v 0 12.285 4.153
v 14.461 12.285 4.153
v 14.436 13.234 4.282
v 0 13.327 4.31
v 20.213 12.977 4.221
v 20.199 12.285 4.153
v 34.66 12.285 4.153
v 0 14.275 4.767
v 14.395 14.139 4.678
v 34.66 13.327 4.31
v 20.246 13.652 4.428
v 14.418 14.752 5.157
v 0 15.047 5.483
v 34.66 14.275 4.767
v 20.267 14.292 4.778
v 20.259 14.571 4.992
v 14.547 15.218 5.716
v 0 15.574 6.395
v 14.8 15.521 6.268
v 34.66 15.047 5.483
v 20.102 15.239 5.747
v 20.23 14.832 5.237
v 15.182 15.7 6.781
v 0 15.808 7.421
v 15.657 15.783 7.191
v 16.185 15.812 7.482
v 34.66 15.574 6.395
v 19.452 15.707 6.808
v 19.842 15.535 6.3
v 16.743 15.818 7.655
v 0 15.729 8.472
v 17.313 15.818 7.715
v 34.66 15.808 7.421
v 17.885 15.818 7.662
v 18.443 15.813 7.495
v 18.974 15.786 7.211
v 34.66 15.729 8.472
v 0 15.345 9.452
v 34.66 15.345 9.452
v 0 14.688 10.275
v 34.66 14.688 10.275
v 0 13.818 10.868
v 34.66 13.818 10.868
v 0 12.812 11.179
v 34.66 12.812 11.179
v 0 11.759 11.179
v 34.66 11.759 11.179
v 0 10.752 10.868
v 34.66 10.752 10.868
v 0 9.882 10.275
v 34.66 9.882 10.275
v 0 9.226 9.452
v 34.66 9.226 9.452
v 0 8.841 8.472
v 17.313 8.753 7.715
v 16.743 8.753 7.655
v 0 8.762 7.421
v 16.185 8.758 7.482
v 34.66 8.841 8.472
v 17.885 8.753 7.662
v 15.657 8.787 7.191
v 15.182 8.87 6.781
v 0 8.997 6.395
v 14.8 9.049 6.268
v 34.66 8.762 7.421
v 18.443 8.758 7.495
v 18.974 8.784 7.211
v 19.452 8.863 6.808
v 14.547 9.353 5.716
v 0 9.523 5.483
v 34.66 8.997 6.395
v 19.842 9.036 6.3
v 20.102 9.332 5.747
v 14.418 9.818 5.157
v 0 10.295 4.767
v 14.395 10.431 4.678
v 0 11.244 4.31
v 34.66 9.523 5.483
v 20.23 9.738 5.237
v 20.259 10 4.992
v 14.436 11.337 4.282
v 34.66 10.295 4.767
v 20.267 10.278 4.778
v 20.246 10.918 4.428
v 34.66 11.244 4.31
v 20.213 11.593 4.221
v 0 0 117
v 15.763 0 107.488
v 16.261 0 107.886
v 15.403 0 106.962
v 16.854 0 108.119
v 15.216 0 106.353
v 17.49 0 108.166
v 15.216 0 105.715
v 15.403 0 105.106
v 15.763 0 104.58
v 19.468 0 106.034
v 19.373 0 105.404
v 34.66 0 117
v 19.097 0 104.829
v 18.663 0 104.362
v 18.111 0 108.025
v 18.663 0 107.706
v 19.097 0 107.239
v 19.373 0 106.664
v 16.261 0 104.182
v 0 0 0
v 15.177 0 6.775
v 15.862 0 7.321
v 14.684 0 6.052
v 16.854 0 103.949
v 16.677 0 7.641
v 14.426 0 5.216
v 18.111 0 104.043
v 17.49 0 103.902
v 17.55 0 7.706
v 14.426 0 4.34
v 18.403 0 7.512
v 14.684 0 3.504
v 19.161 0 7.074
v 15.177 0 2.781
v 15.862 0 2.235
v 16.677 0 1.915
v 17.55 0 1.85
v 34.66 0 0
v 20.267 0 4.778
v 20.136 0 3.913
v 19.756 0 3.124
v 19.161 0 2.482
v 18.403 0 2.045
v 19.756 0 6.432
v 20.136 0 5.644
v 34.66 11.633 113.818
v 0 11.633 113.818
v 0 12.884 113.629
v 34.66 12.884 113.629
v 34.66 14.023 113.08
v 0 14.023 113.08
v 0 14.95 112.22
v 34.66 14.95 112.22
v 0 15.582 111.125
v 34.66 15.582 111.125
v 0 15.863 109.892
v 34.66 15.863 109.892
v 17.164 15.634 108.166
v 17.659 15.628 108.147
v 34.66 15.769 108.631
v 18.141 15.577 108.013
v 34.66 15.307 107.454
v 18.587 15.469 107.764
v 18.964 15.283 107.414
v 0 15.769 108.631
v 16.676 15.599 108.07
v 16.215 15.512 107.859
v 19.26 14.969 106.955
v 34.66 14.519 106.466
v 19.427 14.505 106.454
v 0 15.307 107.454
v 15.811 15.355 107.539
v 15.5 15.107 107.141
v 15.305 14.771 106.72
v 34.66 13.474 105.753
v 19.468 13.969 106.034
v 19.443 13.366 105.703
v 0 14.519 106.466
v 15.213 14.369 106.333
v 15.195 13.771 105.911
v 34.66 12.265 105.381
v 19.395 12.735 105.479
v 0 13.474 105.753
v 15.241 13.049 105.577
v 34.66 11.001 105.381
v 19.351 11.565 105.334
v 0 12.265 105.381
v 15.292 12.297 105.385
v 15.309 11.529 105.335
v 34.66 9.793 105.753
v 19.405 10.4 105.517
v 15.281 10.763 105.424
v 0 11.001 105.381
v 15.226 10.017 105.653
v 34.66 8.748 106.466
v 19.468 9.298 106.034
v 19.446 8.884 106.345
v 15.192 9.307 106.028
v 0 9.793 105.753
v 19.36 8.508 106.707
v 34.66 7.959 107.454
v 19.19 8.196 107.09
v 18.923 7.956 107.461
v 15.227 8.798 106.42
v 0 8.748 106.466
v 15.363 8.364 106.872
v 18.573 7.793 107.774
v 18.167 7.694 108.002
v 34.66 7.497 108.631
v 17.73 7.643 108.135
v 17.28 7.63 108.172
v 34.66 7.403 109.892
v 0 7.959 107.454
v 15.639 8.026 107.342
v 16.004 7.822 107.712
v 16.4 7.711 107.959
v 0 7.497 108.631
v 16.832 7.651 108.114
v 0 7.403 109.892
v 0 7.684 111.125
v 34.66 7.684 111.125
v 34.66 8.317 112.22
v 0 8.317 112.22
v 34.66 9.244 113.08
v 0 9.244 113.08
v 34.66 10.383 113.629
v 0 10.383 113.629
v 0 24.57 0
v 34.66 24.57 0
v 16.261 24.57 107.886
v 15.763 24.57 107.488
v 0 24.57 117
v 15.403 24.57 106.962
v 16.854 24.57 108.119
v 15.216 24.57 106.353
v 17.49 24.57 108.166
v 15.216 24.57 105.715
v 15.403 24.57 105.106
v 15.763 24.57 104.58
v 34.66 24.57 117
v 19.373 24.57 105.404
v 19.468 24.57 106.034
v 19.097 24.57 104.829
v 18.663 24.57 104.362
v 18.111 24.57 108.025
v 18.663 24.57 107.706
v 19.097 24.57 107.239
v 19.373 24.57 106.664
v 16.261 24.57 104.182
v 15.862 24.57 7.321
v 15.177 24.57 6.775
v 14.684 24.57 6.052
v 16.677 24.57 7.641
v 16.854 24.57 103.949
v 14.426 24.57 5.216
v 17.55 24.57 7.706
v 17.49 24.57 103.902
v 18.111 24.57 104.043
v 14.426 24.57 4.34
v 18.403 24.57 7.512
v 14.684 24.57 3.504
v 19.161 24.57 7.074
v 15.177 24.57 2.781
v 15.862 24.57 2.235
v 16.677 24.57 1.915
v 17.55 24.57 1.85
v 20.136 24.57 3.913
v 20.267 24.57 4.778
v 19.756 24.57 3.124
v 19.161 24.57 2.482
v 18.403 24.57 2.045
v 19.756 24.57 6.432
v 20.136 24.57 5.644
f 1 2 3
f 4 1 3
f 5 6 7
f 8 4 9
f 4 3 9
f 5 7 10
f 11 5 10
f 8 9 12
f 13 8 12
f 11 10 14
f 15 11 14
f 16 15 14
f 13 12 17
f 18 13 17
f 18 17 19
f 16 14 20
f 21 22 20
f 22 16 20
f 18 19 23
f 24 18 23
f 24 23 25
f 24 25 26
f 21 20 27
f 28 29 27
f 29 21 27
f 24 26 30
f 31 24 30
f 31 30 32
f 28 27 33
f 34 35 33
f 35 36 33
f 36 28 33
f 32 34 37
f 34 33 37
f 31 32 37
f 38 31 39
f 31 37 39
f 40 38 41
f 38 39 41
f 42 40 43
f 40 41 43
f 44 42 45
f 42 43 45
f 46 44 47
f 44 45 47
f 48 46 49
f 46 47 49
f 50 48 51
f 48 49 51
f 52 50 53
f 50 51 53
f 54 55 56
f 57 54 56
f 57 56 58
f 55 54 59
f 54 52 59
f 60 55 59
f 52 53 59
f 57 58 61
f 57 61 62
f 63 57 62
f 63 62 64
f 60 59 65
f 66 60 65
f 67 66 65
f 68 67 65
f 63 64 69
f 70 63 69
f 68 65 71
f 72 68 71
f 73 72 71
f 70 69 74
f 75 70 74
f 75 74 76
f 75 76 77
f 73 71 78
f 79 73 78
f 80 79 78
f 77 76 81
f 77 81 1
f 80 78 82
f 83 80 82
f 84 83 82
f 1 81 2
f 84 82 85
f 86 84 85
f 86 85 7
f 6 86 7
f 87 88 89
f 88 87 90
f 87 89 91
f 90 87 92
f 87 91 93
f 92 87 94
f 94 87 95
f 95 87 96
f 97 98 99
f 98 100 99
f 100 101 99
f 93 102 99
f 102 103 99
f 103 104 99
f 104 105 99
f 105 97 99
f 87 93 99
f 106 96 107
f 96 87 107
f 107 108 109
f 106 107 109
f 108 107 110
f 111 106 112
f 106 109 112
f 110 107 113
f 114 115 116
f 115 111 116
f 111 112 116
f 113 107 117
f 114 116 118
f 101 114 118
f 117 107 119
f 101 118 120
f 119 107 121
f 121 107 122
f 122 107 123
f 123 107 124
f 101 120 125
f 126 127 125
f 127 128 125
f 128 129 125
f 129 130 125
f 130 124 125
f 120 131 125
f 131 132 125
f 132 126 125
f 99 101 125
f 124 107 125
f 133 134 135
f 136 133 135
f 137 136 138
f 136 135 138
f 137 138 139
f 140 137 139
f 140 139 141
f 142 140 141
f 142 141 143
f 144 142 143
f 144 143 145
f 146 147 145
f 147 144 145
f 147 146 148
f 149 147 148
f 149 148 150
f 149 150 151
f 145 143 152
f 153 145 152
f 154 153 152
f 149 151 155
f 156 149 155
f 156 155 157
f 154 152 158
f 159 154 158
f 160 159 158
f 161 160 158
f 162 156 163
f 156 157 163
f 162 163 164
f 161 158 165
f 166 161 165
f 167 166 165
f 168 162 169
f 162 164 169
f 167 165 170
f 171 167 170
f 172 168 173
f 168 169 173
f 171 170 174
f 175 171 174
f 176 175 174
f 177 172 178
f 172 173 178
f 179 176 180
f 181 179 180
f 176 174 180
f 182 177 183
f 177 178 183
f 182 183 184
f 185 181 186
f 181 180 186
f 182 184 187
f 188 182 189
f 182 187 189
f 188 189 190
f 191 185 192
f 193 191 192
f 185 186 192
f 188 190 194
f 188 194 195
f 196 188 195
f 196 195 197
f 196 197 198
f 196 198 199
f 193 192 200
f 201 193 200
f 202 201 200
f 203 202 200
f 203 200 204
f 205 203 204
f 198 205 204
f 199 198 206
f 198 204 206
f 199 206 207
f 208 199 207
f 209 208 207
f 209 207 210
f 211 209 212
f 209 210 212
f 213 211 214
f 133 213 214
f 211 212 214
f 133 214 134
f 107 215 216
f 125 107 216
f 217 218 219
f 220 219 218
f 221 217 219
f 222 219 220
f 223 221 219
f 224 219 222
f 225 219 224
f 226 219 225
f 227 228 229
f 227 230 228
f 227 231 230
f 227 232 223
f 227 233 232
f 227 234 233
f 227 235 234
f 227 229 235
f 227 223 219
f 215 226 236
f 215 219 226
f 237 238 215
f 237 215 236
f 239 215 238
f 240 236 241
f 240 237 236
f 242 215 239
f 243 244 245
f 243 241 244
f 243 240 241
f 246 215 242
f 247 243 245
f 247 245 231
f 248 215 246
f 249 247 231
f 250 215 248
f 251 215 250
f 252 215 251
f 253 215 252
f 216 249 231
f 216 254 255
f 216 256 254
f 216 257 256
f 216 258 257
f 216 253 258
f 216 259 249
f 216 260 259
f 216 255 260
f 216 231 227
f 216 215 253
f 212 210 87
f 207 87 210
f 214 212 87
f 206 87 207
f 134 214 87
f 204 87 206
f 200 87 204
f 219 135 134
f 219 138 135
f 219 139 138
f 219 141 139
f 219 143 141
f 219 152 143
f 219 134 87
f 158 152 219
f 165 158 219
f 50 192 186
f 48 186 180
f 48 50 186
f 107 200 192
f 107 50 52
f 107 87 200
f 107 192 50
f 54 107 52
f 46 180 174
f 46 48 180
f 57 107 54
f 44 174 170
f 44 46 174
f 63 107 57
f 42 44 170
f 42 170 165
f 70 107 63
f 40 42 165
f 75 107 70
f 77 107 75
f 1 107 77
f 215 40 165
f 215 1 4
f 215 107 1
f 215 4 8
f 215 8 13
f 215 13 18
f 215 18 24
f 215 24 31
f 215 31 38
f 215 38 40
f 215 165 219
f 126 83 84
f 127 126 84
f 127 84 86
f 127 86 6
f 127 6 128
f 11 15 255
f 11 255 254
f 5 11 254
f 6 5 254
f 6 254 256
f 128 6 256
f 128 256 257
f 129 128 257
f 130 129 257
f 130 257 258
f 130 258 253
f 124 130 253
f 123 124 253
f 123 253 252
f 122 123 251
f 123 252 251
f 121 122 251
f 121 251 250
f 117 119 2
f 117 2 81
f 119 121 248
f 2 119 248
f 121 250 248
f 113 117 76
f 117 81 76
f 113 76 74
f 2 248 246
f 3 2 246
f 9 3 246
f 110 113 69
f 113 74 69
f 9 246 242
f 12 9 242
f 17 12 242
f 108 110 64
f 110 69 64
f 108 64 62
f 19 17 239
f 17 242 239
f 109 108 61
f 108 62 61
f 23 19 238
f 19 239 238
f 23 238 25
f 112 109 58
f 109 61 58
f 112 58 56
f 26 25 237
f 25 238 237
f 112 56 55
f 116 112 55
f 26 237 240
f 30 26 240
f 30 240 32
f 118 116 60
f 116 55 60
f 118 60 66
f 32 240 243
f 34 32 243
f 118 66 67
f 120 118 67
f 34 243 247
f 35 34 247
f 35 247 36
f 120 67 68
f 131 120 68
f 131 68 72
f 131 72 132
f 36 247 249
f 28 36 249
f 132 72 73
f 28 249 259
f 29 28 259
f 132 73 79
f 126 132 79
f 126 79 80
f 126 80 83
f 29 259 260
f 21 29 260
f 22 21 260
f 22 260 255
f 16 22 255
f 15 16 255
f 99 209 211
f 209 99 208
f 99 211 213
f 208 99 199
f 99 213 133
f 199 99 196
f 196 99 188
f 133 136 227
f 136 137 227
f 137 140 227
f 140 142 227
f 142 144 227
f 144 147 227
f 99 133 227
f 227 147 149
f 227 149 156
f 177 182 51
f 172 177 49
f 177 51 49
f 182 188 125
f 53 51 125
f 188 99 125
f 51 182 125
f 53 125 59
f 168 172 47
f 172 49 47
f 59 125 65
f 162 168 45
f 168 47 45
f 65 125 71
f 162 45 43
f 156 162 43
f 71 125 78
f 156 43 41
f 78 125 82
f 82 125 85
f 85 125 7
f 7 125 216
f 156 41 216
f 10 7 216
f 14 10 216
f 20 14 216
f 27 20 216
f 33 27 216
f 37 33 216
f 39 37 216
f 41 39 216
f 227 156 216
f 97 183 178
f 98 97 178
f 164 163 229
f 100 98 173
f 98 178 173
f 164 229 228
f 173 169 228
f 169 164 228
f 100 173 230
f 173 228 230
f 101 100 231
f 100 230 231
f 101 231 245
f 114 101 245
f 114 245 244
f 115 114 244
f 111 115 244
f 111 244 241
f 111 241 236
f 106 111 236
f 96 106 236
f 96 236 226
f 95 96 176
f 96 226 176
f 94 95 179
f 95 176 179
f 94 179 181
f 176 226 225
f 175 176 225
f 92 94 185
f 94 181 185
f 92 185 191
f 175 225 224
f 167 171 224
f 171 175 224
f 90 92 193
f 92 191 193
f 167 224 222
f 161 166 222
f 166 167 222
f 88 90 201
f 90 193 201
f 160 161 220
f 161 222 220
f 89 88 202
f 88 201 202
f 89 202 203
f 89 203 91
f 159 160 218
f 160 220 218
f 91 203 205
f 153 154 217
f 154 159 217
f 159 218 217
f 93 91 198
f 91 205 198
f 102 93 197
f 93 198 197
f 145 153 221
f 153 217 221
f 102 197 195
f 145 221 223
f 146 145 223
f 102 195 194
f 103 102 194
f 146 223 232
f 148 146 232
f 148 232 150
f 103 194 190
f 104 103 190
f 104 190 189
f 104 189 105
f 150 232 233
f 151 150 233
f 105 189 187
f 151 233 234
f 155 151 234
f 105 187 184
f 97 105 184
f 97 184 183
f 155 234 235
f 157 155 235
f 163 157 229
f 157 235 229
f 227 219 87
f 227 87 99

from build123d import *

# Parameters (mm, degrees)
SKETCH_1_W          = 34.660183122
SKETCH_1_H          = 24.57042631
EXTRUDE_1_DEPTH     = 117
SKETCH_2_R          = 2.936506095
SKETCH_2_R_2        = 2.138363717
CUT_EXTRUDE_1_DEPTH = 117
SKETCH_3_R          = 4.242126228
CUT_EXTRUDE_2_DEPTH = 117
SKETCH_4_R          = 3.532728848
CUT_EXTRUDE_3_DEPTH = 50


with BuildPart() as part:
    # 草图1 → 凸台-拉伸1 (new body)
    with BuildSketch(Plane.XY):
        with Locations((17.330091561, 12.285213155)):
            Rectangle(SKETCH_1_W, SKETCH_1_H)
    extrude(amount=EXTRUDE_1_DEPTH)

    # 草图2 → 切除-拉伸1 (cut)
    with BuildSketch(Plane(origin=(0, 24.57042631, 0), x_dir=(1, 0, 0), z_dir=(0, 1, 0))):
        with Locations((17.330091561, -4.778141965)):
            Circle(SKETCH_2_R)
        with Locations((17.330091561, -106.034000041)):
            Circle(SKETCH_2_R_2)
    extrude(amount=-CUT_EXTRUDE_1_DEPTH, mode=Mode.SUBTRACT)

    # 草图3 → 切除-拉伸2 (cut)
    with BuildSketch(Plane.ZY):
        with Locations((109.575398108, 11.633186796)):
            Circle(SKETCH_3_R)
    extrude(amount=-CUT_EXTRUDE_2_DEPTH, mode=Mode.SUBTRACT)

    # 草图4 → 切除-拉伸3 (cut)
    with BuildSketch(Plane(origin=(34.660183122, 0, 0), x_dir=(0, 0, -1), z_dir=(1, 0, 0))):
        with Locations((-7.685412436, 12.285213155)):
            Circle(SKETCH_4_R)
    extrude(amount=-CUT_EXTRUDE_3_DEPTH, mode=Mode.SUBTRACT)


solid = part.part
